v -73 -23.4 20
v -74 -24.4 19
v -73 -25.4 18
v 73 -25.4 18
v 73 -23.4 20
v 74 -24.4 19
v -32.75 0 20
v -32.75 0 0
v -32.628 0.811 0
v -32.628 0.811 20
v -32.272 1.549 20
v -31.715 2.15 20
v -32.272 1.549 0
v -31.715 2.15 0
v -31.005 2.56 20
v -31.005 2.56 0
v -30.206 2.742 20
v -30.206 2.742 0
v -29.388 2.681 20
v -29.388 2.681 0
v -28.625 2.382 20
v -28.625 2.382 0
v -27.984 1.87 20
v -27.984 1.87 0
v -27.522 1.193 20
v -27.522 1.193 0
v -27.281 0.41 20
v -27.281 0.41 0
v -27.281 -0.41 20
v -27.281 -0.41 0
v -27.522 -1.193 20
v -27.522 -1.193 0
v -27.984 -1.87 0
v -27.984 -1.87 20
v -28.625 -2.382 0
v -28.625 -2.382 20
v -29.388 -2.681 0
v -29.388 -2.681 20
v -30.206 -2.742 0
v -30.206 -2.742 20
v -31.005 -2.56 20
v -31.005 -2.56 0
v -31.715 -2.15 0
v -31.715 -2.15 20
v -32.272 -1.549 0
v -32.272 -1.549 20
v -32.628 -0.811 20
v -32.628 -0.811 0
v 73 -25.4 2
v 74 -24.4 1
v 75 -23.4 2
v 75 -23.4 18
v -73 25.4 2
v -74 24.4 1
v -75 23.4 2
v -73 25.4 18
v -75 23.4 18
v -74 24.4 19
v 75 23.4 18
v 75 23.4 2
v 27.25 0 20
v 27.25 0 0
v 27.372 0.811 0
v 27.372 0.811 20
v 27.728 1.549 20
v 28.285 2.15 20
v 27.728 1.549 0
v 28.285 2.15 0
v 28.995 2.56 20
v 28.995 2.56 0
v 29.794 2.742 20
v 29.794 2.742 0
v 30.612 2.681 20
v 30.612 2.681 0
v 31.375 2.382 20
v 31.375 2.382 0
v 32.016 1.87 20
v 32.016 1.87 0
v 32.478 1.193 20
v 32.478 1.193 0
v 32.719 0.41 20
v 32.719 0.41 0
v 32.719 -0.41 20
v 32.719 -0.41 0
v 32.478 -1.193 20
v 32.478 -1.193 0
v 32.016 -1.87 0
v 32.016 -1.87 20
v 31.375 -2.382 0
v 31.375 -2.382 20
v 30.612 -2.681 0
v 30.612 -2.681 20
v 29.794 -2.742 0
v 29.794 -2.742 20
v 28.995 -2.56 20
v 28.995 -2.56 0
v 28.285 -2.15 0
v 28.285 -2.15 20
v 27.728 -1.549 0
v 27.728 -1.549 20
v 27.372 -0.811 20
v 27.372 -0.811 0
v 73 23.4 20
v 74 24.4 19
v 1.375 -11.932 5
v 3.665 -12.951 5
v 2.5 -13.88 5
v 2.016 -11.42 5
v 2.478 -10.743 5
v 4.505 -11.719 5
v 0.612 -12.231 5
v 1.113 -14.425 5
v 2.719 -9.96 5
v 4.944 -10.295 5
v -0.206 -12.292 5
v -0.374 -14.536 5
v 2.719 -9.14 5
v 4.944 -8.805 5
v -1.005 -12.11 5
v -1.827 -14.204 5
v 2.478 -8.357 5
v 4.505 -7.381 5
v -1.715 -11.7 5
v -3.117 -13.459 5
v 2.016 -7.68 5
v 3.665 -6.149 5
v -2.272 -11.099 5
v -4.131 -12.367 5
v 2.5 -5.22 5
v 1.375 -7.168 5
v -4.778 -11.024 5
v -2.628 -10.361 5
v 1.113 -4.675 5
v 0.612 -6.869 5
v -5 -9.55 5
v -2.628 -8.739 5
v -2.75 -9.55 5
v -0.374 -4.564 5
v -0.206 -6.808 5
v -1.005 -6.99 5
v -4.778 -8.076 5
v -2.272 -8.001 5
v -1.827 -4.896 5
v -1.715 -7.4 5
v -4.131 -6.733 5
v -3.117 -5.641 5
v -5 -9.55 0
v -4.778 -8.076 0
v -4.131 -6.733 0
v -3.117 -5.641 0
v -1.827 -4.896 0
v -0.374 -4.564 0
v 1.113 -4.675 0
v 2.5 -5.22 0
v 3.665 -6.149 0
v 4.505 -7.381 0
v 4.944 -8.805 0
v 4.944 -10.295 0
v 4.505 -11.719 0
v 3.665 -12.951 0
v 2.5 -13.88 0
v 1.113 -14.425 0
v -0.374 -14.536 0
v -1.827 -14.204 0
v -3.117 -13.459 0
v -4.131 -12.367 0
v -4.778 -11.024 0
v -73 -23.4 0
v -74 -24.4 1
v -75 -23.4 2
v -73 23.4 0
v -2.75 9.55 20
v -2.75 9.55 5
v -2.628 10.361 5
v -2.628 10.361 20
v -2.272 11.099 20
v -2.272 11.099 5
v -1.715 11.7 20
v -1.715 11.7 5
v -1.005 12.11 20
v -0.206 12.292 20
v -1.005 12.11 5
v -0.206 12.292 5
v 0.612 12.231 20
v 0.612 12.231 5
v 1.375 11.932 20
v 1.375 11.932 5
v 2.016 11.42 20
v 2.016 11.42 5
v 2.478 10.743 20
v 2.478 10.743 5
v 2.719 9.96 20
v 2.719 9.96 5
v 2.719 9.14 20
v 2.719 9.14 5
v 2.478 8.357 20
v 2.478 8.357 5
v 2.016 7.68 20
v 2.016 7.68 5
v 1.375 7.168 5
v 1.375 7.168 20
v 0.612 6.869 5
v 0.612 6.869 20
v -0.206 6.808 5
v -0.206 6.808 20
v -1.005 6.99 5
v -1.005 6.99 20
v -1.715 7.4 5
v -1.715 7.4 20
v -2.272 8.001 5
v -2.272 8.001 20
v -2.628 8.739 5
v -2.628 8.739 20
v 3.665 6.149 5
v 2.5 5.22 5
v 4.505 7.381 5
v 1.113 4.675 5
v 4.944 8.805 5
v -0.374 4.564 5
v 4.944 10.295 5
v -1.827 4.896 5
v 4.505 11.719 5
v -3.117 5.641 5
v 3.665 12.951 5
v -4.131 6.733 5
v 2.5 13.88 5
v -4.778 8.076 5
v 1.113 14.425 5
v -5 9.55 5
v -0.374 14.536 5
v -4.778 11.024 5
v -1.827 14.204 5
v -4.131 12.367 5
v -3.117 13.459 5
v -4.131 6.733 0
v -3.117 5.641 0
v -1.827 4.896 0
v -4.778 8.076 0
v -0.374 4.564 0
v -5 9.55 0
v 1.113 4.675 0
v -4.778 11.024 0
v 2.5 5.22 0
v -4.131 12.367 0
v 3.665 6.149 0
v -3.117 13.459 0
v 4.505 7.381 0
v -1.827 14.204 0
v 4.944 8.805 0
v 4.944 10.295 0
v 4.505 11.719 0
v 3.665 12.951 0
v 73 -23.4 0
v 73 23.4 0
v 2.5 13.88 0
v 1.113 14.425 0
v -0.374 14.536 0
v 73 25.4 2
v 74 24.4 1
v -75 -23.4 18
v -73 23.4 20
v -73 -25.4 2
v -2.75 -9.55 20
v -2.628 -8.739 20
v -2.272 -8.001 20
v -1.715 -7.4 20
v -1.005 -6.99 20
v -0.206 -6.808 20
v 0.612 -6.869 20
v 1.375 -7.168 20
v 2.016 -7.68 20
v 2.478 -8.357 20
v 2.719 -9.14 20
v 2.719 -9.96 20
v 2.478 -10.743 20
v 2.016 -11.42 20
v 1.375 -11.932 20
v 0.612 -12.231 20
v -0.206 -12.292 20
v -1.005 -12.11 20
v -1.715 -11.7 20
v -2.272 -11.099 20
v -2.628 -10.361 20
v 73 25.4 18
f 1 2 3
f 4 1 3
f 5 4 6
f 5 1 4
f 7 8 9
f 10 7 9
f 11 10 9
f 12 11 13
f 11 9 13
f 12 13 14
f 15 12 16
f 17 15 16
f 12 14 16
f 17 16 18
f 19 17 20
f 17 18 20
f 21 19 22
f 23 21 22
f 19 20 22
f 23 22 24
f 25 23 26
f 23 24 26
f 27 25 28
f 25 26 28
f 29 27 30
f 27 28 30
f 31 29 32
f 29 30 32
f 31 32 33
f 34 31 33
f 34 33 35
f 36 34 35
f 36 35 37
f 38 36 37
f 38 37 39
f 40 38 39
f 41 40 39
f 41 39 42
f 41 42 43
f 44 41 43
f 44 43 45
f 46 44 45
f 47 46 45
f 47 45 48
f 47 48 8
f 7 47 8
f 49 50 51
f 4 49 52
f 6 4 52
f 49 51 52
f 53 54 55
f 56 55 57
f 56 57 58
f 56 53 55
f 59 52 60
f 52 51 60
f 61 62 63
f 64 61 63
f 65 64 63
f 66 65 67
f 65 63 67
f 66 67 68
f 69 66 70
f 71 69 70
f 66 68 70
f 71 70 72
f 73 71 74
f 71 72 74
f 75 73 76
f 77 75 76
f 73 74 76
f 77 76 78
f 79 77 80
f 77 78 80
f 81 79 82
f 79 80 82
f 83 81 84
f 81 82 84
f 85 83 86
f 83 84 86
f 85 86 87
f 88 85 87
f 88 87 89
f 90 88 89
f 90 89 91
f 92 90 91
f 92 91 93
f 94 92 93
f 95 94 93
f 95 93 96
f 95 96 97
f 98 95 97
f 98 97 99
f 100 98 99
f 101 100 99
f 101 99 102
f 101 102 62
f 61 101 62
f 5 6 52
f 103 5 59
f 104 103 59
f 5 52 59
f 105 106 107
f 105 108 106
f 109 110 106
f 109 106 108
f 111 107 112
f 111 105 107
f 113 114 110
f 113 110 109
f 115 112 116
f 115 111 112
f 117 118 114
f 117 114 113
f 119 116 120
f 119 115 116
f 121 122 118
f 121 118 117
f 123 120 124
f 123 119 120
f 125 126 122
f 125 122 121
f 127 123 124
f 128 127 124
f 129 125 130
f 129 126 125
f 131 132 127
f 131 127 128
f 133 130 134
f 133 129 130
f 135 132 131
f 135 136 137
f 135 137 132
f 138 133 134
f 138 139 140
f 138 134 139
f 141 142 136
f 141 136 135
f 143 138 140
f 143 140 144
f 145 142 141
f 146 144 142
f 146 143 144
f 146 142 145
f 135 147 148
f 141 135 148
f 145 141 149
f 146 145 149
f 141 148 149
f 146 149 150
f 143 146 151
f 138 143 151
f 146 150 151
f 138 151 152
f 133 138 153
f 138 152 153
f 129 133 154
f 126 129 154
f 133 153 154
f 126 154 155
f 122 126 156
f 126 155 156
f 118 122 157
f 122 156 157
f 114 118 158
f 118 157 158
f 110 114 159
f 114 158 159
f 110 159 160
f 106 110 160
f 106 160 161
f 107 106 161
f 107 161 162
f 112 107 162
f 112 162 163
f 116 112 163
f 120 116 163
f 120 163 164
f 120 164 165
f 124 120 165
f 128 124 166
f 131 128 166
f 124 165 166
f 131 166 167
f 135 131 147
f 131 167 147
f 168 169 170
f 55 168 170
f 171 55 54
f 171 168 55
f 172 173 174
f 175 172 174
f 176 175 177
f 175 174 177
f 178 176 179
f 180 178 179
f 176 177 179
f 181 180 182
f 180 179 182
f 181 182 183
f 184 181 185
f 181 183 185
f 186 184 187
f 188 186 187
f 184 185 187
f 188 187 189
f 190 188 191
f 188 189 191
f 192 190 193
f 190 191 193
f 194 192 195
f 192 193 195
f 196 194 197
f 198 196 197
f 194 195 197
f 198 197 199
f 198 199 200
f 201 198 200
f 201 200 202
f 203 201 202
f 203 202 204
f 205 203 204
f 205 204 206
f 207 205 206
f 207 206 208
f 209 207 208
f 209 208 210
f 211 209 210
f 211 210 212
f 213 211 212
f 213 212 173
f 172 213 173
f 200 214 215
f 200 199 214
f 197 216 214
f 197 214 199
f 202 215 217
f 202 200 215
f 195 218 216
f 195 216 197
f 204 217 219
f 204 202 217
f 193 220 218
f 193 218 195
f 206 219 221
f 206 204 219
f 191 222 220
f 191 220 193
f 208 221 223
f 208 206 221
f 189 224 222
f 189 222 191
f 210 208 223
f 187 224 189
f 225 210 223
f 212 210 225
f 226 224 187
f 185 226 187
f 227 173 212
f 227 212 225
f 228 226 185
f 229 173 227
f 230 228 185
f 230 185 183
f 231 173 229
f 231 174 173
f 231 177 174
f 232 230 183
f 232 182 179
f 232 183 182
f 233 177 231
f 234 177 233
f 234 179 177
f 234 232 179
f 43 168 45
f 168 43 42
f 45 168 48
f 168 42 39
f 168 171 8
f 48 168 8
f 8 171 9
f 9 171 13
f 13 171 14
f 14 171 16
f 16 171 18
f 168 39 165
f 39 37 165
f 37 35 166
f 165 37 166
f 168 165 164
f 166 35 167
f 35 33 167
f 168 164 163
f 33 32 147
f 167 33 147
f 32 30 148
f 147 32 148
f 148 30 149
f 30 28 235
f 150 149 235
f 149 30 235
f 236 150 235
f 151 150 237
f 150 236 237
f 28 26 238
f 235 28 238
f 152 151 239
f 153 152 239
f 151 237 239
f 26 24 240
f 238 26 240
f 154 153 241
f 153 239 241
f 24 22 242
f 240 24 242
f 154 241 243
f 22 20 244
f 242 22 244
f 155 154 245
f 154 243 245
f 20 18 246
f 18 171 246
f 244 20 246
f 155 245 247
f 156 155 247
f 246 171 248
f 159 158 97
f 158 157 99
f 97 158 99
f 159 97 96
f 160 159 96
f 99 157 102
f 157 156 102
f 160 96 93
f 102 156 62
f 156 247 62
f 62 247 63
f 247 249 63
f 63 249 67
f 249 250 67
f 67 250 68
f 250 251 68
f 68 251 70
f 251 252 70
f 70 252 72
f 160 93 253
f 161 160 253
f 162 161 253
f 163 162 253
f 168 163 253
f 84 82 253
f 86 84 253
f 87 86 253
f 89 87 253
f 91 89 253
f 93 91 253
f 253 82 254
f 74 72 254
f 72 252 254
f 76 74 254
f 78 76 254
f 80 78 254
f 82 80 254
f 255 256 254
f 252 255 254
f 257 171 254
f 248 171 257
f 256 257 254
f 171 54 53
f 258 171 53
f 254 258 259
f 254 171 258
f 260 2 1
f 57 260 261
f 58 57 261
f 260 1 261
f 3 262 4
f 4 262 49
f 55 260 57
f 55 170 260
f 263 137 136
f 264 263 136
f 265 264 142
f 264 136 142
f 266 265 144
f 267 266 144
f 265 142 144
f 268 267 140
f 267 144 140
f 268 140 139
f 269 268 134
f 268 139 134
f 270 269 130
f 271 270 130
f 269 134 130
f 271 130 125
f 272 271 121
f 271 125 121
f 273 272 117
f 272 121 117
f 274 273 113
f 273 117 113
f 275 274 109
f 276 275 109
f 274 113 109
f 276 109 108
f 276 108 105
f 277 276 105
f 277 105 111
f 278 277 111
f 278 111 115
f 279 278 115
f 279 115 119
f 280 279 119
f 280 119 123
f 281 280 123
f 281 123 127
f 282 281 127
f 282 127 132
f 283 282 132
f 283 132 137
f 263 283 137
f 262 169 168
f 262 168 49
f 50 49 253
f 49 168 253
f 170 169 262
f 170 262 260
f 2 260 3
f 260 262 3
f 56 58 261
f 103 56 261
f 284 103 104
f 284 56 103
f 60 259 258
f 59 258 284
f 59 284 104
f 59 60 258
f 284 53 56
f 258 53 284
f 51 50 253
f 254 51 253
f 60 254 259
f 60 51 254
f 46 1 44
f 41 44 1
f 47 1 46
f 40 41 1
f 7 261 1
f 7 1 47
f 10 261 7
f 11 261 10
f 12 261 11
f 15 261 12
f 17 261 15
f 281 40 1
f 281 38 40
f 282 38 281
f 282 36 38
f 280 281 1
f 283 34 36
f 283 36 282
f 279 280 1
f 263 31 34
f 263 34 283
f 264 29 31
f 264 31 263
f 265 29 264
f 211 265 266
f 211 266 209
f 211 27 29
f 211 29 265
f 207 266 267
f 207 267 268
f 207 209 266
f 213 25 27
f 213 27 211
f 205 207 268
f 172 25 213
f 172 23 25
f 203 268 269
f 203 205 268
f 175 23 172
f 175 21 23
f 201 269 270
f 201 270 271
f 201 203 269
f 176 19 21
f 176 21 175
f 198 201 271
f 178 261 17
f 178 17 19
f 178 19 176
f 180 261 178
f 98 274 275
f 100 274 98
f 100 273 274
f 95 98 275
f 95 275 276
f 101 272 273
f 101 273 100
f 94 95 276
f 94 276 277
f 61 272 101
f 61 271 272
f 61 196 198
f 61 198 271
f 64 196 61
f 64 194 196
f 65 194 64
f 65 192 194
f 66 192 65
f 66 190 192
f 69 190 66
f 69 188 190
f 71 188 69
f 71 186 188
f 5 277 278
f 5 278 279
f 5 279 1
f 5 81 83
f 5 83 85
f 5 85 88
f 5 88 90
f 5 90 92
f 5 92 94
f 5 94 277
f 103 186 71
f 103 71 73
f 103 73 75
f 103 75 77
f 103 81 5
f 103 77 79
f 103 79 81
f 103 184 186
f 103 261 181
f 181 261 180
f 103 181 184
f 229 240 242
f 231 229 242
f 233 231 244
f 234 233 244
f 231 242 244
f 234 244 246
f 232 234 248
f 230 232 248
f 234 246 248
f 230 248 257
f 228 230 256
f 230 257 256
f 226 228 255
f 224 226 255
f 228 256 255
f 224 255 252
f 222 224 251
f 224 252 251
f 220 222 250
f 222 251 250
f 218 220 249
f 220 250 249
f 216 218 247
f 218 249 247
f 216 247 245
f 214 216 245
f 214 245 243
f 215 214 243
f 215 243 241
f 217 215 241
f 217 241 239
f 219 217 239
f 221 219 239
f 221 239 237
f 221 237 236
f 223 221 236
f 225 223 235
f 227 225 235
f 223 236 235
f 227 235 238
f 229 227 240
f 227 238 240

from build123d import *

# Parameters (mm, degrees)
CROQUIS1_W              = 150
CROQUIS1_H              = 50.8
SALIENTE_EXTRUIR1_DEPTH = 20
CROQUIS2_R              = 2.75
CORTAR_EXTRUIR1_DEPTH   = 21
CROQUIS3_R              = 5
CORTAR_EXTRUIR2_DEPTH   = 5
CHAFL_N1_SIZE           = 2
CHAFL_N2_SIZE           = 2
CHAFL_N3_SIZE           = 2


with BuildPart() as part:
    # Croquis1 → Saliente-Extruir1 (new body)
    with BuildSketch(Plane.XY):
        Rectangle(CROQUIS1_W, CROQUIS1_H)
    extrude(amount=SALIENTE_EXTRUIR1_DEPTH)

    # Croquis2 → Cortar-Extruir1 (cut, through all)
    with BuildSketch(Plane(origin=(0, 0, 0), x_dir=(-1, 0, 0), z_dir=(0, 0, -1))):
        with Locations((0, 9.55)):
            Circle(CROQUIS2_R)
        with Locations((0, -9.55)):
            Circle(CROQUIS2_R)
        with Locations((30, 0)):
            Circle(CROQUIS2_R)
        with Locations((-30, 0)):
            Circle(CROQUIS2_R)
    extrude(amount=-CORTAR_EXTRUIR1_DEPTH, mode=Mode.SUBTRACT)

    # Croquis3 → Cortar-Extruir2 (cut)
    with BuildSketch(Plane(origin=(0, 0, 0), x_dir=(-1, 0, 0), z_dir=(0, 0, -1))):
        with Locations((0, 9.55)):
            Circle(CROQUIS3_R)
        with Locations((0, -9.55)):
            Circle(CROQUIS3_R)
    extrude(amount=-CORTAR_EXTRUIR2_DEPTH, mode=Mode.SUBTRACT)

    # Chaflán1
    chafl_n1_edges = [part.edges().sort_by_distance(p)[0] for p in [
        (0, -25.4, 0),
        (-75, 0, 0),
        (0, 25.4, 0),
        (75, 0, 0),
    ]]
    chamfer(chafl_n1_edges, length=CHAFL_N1_SIZE)

    # Chaflán2
    chafl_n2_edges = [part.edges().sort_by_distance(p)[0] for p in [
        (-75, 0, 20),
        (0, -25.4, 20),
        (75, 0, 20),
        (0, 25.4, 20),
    ]]
    chamfer(chafl_n2_edges, length=CHAFL_N2_SIZE)

    # Chaflán3
    chafl_n3_edges = [part.edges().sort_by_distance(p)[0] for p in [
        (-75, 25.4, 10),
        (-75, -25.4, 10),
        (75, 25.4, 10),
        (75, -25.4, 10),
    ]]
    chamfer(chafl_n3_edges, length=CHAFL_N3_SIZE)


solid = part.part
